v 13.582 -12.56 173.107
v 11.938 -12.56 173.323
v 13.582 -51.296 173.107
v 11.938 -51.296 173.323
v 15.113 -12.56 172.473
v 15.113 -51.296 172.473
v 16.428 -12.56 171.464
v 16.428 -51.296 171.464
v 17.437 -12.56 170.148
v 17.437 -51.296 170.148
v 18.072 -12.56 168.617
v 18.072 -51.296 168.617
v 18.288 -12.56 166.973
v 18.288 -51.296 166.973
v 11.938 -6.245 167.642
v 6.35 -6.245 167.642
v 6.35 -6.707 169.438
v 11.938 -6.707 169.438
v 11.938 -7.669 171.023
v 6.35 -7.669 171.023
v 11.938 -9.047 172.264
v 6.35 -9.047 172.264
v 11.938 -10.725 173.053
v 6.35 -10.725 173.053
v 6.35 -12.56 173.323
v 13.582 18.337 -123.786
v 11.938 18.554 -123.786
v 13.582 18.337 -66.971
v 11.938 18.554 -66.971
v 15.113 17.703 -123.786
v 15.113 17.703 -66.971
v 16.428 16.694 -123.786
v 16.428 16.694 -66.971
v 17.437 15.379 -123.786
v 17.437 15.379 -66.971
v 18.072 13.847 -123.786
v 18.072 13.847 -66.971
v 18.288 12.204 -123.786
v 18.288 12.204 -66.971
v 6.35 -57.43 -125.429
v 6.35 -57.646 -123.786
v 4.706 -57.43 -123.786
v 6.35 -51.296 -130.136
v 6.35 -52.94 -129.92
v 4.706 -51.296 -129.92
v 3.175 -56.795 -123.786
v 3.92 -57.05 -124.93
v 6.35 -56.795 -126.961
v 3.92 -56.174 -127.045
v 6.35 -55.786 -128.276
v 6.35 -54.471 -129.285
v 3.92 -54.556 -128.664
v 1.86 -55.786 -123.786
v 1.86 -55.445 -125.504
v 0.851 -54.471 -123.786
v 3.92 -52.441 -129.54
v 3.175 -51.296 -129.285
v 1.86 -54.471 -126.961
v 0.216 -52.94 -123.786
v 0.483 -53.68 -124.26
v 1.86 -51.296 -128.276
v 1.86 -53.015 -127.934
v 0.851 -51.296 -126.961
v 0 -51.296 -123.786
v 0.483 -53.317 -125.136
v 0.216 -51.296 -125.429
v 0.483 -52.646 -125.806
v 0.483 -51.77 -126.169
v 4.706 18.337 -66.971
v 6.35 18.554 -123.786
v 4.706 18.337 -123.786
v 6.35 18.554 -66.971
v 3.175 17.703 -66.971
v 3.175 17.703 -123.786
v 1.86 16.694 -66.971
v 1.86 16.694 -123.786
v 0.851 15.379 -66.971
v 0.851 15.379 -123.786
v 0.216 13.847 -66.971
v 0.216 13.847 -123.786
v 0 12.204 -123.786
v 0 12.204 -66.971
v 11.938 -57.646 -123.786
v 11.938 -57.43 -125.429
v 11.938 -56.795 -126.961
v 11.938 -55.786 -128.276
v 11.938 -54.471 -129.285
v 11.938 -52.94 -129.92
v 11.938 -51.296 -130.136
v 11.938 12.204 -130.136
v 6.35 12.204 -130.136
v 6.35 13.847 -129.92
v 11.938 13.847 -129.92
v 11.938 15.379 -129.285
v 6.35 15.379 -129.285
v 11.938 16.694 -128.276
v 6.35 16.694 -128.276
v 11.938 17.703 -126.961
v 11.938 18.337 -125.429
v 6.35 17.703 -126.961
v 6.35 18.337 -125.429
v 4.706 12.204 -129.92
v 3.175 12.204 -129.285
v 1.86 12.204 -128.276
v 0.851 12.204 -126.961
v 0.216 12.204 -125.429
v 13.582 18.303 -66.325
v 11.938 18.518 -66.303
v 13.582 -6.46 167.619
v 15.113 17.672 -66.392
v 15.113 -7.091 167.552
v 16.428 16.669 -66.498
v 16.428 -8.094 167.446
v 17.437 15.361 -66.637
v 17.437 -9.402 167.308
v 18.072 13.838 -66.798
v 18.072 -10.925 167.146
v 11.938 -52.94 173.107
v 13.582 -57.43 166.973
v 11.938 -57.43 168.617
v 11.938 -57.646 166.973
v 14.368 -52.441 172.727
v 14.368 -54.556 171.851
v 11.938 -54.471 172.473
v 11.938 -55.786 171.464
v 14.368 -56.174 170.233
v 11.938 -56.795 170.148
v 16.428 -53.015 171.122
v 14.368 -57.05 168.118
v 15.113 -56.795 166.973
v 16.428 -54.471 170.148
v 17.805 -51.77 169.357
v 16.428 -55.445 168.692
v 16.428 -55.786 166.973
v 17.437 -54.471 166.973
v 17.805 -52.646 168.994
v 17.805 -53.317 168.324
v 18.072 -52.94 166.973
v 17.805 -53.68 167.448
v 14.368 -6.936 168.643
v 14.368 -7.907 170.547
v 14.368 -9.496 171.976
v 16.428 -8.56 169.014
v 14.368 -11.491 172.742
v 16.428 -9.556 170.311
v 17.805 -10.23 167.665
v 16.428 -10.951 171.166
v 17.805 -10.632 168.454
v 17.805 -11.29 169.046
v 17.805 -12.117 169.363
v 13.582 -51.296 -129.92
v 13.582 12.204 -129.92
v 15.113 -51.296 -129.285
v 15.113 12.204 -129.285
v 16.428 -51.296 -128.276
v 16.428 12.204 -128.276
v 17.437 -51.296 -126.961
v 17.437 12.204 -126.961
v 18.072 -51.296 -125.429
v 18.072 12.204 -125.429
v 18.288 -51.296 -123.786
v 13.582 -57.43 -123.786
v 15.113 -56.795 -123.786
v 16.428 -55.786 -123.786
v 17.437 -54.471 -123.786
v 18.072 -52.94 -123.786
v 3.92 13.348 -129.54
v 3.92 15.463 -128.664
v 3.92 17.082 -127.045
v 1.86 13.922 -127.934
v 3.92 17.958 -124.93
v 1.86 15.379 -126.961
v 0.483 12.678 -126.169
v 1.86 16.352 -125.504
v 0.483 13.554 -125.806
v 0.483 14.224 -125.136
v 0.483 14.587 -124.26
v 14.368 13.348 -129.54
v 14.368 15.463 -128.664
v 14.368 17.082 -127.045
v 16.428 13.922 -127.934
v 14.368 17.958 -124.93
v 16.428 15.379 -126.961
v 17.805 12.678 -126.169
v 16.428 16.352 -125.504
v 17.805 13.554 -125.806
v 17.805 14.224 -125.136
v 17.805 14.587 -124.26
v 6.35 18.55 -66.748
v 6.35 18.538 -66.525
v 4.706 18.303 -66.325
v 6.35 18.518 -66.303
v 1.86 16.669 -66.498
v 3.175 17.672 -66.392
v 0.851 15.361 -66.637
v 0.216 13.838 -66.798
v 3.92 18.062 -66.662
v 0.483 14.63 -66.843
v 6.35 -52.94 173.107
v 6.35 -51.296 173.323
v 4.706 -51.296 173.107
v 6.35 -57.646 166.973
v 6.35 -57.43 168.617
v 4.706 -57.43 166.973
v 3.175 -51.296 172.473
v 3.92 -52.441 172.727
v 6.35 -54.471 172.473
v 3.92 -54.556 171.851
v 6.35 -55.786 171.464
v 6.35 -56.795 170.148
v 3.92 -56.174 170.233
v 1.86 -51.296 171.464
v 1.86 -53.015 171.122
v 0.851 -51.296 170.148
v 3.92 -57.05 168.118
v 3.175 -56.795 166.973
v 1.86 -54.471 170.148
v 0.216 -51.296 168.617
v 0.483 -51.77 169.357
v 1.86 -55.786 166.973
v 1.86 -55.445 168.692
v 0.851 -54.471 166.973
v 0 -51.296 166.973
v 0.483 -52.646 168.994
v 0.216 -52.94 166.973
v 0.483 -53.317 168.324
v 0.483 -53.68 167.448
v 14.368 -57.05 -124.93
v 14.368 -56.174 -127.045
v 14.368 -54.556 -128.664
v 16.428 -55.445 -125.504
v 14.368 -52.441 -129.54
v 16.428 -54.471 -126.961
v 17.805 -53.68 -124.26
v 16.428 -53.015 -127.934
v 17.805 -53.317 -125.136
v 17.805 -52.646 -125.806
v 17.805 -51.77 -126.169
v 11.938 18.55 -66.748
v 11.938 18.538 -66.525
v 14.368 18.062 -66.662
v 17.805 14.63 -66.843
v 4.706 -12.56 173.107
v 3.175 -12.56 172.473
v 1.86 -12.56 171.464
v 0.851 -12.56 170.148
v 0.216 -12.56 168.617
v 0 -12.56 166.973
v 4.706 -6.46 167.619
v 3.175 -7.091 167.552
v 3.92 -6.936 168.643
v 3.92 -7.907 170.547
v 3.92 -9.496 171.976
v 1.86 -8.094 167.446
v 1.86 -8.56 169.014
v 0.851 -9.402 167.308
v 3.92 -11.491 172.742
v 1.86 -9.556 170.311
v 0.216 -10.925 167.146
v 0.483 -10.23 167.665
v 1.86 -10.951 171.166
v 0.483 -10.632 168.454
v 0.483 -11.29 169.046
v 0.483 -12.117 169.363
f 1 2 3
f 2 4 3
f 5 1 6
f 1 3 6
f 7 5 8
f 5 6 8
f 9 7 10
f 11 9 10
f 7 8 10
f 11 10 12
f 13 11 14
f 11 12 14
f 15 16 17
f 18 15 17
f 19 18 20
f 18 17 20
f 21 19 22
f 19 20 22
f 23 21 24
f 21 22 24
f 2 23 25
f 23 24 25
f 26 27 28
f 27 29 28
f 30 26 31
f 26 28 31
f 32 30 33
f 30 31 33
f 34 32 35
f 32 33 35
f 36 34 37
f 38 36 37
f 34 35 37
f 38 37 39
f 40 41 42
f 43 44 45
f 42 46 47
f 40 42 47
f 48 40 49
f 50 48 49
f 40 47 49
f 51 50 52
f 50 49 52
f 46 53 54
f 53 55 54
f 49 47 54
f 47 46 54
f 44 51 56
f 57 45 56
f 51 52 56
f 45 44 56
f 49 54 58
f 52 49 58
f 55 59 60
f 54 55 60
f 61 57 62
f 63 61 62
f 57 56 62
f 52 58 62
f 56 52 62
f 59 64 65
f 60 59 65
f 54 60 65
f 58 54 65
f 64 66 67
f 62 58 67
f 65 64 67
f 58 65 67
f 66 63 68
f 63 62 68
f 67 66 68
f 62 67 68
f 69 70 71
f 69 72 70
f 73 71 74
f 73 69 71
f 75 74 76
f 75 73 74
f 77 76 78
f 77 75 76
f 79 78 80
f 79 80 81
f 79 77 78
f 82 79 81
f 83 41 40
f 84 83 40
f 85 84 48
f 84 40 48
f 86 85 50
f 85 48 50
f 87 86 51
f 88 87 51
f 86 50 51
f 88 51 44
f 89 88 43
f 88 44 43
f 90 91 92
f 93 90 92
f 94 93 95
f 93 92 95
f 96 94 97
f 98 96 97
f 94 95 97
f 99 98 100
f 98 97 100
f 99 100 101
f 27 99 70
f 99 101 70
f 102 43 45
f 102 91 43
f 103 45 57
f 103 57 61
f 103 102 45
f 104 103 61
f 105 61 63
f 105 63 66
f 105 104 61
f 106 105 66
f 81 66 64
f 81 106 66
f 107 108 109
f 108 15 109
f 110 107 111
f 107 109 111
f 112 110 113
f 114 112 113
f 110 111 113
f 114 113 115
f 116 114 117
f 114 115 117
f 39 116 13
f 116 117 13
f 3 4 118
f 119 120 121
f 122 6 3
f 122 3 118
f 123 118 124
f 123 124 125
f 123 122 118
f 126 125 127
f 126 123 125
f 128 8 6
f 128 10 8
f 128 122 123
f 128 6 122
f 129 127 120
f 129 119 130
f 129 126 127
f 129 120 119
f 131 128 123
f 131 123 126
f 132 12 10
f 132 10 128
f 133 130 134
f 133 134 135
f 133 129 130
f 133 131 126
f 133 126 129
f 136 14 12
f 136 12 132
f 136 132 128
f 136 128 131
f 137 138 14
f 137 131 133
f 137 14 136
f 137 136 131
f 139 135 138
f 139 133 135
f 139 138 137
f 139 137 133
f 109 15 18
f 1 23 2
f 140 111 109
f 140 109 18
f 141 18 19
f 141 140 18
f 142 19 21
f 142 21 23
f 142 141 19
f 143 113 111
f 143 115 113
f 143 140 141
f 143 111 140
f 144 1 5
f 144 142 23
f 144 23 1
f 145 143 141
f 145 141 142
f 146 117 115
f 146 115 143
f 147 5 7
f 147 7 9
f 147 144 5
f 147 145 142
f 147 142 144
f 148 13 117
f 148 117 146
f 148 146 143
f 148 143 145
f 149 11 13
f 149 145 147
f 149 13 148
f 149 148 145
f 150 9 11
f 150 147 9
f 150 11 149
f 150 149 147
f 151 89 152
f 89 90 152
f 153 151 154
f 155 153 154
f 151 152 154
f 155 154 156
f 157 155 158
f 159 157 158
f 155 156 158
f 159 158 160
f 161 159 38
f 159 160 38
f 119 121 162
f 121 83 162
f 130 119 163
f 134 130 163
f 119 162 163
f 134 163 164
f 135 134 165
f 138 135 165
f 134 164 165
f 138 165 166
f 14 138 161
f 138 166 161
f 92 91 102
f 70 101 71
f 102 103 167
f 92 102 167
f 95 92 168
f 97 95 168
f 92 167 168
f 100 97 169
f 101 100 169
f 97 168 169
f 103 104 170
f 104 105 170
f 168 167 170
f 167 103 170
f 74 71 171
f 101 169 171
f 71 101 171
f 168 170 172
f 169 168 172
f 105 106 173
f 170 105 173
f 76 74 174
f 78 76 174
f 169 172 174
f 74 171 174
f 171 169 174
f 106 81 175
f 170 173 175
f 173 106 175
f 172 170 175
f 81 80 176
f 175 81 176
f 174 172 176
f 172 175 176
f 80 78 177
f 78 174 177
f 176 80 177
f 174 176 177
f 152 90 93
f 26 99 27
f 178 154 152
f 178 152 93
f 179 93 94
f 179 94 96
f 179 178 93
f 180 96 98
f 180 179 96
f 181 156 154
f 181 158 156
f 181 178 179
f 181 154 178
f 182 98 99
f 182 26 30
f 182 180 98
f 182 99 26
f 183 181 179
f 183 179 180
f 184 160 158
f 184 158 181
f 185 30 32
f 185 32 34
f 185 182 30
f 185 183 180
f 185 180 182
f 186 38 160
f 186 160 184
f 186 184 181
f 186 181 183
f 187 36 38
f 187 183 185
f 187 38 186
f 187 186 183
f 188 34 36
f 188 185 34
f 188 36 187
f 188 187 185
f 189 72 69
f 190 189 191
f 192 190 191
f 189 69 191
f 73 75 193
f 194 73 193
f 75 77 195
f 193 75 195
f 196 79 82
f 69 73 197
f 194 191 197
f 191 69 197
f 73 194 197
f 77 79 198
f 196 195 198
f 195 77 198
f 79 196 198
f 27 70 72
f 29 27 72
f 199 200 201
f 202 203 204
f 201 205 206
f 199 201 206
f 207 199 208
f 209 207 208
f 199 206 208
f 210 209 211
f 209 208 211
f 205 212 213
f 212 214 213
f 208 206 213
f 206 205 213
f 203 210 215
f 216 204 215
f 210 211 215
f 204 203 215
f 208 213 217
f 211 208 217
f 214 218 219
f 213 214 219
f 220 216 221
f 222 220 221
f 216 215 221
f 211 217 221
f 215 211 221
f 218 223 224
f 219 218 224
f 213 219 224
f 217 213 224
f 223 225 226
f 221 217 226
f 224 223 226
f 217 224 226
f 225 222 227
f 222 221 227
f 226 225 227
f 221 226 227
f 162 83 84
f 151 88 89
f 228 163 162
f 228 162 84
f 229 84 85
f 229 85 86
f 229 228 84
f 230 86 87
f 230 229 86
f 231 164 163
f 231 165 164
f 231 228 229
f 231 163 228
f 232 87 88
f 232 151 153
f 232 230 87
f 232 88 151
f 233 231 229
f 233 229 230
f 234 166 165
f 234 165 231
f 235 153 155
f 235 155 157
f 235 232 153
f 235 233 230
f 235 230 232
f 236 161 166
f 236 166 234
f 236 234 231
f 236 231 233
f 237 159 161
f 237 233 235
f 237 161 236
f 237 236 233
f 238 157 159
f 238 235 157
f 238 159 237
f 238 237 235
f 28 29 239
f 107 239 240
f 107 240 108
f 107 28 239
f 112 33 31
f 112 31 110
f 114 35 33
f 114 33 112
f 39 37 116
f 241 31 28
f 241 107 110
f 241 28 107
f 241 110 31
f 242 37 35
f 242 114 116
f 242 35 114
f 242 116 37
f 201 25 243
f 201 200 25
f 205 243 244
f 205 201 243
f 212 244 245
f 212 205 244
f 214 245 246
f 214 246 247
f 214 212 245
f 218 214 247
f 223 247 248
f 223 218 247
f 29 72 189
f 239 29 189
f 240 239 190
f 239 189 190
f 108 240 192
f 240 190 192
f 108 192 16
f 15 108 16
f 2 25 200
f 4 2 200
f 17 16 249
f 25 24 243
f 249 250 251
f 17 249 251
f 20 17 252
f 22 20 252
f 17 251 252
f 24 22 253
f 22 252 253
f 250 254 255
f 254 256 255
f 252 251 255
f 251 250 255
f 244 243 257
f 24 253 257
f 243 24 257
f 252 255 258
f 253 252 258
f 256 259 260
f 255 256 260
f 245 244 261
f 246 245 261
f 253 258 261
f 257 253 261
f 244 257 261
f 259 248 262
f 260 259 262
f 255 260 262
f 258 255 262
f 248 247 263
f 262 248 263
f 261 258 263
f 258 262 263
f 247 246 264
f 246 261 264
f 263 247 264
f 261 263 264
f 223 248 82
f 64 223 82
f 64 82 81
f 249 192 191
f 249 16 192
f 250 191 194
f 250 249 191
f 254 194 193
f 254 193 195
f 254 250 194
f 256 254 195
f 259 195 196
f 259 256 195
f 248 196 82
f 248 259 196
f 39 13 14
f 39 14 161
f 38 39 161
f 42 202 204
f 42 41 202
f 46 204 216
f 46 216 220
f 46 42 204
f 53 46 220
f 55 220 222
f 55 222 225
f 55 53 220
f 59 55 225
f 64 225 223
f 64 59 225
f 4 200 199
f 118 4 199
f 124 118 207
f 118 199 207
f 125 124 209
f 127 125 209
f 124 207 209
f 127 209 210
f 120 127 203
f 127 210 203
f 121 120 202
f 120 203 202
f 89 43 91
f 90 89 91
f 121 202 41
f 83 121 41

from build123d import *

# Parameters (mm, degrees)
BOSS_EXTRUDE1_DEPTH = 18.288
FILLET1_R           = 6.35


with BuildPart() as part:
    # Sketch1 → Boss-Extrude1 (new body)
    with BuildSketch(Plane(origin=(0, 0, 0), x_dir=(0, 0, -1), z_dir=(1, 0, 0))):
        with BuildLine():
            Line((-166.973473818, -57.646230654), (123.785960254, -57.646230654))
            ThreePointArc((123.785960254, -57.646230654), (128.276088314, -55.786358715), (130.135960254, -51.296230654))
            Line((130.135960254, -51.296230654), (130.135960254, 12.203769346))
            ThreePointArc((130.135960254, 12.203769346), (128.276088314, 16.693897406), (123.785960254, 18.553769346))
            Line((123.785960254, 18.553769346), (66.971101736, 18.553769346))
            ThreePointArc((66.971101736, 18.553769346), (66.636426055, 18.5449437), (66.302680683, 18.518491295))
            Line((66.302680683, 18.518491295), (-167.641894871, -6.244828564))
            ThreePointArc((-167.641894871, -6.244828564), (-171.694012648, -8.31231457), (-173.323473818, -12.559550513))
            Line((-173.323473818, -12.559550513), (-173.323473818, -51.296230654))
            ThreePointArc((-173.323473818, -51.296230654), (-171.463601879, -55.786358715), (-166.973473818, -57.646230654))
        make_face()
    extrude(amount=BOSS_EXTRUDE1_DEPTH)

    # Fillet1
    fillet1_edges = [part.edges().sort_by_distance(p)[0] for p in [
        (18.288, -8.31231457, 171.694012648),
        (0, -19.546230654, -130.135960254),
        (0, -55.786358715, -128.276088314),
        (0, -57.646230654, 21.593756782),
        (0, -55.786358715, 171.463601879),
        (0, -31.927890584, 173.323473818),
        (0, -8.31231457, 171.694012648),
        (0, 6.136831366, 50.669607094),
        (0, 18.5449437, -66.636426055),
        (18.288, -31.927890584, 173.323473818),
        (18.288, -55.786358715, 171.463601879),
        (18.288, -57.646230654, 21.593756782),
        (18.288, -55.786358715, -128.276088314),
        (18.288, -19.546230654, -130.135960254),
        (18.288, 16.693897406, -128.276088314),
        (18.288, 18.553769346, -95.378530995),
        (18.288, 18.5449437, -66.636426055),
        (18.288, 6.136831366, 50.669607094),
        (0, 18.553769346, -95.378530995),
        (0, 16.693897406, -128.276088314),
    ]]
    fillet(fillet1_edges, radius=FILLET1_R)


solid = part.part
